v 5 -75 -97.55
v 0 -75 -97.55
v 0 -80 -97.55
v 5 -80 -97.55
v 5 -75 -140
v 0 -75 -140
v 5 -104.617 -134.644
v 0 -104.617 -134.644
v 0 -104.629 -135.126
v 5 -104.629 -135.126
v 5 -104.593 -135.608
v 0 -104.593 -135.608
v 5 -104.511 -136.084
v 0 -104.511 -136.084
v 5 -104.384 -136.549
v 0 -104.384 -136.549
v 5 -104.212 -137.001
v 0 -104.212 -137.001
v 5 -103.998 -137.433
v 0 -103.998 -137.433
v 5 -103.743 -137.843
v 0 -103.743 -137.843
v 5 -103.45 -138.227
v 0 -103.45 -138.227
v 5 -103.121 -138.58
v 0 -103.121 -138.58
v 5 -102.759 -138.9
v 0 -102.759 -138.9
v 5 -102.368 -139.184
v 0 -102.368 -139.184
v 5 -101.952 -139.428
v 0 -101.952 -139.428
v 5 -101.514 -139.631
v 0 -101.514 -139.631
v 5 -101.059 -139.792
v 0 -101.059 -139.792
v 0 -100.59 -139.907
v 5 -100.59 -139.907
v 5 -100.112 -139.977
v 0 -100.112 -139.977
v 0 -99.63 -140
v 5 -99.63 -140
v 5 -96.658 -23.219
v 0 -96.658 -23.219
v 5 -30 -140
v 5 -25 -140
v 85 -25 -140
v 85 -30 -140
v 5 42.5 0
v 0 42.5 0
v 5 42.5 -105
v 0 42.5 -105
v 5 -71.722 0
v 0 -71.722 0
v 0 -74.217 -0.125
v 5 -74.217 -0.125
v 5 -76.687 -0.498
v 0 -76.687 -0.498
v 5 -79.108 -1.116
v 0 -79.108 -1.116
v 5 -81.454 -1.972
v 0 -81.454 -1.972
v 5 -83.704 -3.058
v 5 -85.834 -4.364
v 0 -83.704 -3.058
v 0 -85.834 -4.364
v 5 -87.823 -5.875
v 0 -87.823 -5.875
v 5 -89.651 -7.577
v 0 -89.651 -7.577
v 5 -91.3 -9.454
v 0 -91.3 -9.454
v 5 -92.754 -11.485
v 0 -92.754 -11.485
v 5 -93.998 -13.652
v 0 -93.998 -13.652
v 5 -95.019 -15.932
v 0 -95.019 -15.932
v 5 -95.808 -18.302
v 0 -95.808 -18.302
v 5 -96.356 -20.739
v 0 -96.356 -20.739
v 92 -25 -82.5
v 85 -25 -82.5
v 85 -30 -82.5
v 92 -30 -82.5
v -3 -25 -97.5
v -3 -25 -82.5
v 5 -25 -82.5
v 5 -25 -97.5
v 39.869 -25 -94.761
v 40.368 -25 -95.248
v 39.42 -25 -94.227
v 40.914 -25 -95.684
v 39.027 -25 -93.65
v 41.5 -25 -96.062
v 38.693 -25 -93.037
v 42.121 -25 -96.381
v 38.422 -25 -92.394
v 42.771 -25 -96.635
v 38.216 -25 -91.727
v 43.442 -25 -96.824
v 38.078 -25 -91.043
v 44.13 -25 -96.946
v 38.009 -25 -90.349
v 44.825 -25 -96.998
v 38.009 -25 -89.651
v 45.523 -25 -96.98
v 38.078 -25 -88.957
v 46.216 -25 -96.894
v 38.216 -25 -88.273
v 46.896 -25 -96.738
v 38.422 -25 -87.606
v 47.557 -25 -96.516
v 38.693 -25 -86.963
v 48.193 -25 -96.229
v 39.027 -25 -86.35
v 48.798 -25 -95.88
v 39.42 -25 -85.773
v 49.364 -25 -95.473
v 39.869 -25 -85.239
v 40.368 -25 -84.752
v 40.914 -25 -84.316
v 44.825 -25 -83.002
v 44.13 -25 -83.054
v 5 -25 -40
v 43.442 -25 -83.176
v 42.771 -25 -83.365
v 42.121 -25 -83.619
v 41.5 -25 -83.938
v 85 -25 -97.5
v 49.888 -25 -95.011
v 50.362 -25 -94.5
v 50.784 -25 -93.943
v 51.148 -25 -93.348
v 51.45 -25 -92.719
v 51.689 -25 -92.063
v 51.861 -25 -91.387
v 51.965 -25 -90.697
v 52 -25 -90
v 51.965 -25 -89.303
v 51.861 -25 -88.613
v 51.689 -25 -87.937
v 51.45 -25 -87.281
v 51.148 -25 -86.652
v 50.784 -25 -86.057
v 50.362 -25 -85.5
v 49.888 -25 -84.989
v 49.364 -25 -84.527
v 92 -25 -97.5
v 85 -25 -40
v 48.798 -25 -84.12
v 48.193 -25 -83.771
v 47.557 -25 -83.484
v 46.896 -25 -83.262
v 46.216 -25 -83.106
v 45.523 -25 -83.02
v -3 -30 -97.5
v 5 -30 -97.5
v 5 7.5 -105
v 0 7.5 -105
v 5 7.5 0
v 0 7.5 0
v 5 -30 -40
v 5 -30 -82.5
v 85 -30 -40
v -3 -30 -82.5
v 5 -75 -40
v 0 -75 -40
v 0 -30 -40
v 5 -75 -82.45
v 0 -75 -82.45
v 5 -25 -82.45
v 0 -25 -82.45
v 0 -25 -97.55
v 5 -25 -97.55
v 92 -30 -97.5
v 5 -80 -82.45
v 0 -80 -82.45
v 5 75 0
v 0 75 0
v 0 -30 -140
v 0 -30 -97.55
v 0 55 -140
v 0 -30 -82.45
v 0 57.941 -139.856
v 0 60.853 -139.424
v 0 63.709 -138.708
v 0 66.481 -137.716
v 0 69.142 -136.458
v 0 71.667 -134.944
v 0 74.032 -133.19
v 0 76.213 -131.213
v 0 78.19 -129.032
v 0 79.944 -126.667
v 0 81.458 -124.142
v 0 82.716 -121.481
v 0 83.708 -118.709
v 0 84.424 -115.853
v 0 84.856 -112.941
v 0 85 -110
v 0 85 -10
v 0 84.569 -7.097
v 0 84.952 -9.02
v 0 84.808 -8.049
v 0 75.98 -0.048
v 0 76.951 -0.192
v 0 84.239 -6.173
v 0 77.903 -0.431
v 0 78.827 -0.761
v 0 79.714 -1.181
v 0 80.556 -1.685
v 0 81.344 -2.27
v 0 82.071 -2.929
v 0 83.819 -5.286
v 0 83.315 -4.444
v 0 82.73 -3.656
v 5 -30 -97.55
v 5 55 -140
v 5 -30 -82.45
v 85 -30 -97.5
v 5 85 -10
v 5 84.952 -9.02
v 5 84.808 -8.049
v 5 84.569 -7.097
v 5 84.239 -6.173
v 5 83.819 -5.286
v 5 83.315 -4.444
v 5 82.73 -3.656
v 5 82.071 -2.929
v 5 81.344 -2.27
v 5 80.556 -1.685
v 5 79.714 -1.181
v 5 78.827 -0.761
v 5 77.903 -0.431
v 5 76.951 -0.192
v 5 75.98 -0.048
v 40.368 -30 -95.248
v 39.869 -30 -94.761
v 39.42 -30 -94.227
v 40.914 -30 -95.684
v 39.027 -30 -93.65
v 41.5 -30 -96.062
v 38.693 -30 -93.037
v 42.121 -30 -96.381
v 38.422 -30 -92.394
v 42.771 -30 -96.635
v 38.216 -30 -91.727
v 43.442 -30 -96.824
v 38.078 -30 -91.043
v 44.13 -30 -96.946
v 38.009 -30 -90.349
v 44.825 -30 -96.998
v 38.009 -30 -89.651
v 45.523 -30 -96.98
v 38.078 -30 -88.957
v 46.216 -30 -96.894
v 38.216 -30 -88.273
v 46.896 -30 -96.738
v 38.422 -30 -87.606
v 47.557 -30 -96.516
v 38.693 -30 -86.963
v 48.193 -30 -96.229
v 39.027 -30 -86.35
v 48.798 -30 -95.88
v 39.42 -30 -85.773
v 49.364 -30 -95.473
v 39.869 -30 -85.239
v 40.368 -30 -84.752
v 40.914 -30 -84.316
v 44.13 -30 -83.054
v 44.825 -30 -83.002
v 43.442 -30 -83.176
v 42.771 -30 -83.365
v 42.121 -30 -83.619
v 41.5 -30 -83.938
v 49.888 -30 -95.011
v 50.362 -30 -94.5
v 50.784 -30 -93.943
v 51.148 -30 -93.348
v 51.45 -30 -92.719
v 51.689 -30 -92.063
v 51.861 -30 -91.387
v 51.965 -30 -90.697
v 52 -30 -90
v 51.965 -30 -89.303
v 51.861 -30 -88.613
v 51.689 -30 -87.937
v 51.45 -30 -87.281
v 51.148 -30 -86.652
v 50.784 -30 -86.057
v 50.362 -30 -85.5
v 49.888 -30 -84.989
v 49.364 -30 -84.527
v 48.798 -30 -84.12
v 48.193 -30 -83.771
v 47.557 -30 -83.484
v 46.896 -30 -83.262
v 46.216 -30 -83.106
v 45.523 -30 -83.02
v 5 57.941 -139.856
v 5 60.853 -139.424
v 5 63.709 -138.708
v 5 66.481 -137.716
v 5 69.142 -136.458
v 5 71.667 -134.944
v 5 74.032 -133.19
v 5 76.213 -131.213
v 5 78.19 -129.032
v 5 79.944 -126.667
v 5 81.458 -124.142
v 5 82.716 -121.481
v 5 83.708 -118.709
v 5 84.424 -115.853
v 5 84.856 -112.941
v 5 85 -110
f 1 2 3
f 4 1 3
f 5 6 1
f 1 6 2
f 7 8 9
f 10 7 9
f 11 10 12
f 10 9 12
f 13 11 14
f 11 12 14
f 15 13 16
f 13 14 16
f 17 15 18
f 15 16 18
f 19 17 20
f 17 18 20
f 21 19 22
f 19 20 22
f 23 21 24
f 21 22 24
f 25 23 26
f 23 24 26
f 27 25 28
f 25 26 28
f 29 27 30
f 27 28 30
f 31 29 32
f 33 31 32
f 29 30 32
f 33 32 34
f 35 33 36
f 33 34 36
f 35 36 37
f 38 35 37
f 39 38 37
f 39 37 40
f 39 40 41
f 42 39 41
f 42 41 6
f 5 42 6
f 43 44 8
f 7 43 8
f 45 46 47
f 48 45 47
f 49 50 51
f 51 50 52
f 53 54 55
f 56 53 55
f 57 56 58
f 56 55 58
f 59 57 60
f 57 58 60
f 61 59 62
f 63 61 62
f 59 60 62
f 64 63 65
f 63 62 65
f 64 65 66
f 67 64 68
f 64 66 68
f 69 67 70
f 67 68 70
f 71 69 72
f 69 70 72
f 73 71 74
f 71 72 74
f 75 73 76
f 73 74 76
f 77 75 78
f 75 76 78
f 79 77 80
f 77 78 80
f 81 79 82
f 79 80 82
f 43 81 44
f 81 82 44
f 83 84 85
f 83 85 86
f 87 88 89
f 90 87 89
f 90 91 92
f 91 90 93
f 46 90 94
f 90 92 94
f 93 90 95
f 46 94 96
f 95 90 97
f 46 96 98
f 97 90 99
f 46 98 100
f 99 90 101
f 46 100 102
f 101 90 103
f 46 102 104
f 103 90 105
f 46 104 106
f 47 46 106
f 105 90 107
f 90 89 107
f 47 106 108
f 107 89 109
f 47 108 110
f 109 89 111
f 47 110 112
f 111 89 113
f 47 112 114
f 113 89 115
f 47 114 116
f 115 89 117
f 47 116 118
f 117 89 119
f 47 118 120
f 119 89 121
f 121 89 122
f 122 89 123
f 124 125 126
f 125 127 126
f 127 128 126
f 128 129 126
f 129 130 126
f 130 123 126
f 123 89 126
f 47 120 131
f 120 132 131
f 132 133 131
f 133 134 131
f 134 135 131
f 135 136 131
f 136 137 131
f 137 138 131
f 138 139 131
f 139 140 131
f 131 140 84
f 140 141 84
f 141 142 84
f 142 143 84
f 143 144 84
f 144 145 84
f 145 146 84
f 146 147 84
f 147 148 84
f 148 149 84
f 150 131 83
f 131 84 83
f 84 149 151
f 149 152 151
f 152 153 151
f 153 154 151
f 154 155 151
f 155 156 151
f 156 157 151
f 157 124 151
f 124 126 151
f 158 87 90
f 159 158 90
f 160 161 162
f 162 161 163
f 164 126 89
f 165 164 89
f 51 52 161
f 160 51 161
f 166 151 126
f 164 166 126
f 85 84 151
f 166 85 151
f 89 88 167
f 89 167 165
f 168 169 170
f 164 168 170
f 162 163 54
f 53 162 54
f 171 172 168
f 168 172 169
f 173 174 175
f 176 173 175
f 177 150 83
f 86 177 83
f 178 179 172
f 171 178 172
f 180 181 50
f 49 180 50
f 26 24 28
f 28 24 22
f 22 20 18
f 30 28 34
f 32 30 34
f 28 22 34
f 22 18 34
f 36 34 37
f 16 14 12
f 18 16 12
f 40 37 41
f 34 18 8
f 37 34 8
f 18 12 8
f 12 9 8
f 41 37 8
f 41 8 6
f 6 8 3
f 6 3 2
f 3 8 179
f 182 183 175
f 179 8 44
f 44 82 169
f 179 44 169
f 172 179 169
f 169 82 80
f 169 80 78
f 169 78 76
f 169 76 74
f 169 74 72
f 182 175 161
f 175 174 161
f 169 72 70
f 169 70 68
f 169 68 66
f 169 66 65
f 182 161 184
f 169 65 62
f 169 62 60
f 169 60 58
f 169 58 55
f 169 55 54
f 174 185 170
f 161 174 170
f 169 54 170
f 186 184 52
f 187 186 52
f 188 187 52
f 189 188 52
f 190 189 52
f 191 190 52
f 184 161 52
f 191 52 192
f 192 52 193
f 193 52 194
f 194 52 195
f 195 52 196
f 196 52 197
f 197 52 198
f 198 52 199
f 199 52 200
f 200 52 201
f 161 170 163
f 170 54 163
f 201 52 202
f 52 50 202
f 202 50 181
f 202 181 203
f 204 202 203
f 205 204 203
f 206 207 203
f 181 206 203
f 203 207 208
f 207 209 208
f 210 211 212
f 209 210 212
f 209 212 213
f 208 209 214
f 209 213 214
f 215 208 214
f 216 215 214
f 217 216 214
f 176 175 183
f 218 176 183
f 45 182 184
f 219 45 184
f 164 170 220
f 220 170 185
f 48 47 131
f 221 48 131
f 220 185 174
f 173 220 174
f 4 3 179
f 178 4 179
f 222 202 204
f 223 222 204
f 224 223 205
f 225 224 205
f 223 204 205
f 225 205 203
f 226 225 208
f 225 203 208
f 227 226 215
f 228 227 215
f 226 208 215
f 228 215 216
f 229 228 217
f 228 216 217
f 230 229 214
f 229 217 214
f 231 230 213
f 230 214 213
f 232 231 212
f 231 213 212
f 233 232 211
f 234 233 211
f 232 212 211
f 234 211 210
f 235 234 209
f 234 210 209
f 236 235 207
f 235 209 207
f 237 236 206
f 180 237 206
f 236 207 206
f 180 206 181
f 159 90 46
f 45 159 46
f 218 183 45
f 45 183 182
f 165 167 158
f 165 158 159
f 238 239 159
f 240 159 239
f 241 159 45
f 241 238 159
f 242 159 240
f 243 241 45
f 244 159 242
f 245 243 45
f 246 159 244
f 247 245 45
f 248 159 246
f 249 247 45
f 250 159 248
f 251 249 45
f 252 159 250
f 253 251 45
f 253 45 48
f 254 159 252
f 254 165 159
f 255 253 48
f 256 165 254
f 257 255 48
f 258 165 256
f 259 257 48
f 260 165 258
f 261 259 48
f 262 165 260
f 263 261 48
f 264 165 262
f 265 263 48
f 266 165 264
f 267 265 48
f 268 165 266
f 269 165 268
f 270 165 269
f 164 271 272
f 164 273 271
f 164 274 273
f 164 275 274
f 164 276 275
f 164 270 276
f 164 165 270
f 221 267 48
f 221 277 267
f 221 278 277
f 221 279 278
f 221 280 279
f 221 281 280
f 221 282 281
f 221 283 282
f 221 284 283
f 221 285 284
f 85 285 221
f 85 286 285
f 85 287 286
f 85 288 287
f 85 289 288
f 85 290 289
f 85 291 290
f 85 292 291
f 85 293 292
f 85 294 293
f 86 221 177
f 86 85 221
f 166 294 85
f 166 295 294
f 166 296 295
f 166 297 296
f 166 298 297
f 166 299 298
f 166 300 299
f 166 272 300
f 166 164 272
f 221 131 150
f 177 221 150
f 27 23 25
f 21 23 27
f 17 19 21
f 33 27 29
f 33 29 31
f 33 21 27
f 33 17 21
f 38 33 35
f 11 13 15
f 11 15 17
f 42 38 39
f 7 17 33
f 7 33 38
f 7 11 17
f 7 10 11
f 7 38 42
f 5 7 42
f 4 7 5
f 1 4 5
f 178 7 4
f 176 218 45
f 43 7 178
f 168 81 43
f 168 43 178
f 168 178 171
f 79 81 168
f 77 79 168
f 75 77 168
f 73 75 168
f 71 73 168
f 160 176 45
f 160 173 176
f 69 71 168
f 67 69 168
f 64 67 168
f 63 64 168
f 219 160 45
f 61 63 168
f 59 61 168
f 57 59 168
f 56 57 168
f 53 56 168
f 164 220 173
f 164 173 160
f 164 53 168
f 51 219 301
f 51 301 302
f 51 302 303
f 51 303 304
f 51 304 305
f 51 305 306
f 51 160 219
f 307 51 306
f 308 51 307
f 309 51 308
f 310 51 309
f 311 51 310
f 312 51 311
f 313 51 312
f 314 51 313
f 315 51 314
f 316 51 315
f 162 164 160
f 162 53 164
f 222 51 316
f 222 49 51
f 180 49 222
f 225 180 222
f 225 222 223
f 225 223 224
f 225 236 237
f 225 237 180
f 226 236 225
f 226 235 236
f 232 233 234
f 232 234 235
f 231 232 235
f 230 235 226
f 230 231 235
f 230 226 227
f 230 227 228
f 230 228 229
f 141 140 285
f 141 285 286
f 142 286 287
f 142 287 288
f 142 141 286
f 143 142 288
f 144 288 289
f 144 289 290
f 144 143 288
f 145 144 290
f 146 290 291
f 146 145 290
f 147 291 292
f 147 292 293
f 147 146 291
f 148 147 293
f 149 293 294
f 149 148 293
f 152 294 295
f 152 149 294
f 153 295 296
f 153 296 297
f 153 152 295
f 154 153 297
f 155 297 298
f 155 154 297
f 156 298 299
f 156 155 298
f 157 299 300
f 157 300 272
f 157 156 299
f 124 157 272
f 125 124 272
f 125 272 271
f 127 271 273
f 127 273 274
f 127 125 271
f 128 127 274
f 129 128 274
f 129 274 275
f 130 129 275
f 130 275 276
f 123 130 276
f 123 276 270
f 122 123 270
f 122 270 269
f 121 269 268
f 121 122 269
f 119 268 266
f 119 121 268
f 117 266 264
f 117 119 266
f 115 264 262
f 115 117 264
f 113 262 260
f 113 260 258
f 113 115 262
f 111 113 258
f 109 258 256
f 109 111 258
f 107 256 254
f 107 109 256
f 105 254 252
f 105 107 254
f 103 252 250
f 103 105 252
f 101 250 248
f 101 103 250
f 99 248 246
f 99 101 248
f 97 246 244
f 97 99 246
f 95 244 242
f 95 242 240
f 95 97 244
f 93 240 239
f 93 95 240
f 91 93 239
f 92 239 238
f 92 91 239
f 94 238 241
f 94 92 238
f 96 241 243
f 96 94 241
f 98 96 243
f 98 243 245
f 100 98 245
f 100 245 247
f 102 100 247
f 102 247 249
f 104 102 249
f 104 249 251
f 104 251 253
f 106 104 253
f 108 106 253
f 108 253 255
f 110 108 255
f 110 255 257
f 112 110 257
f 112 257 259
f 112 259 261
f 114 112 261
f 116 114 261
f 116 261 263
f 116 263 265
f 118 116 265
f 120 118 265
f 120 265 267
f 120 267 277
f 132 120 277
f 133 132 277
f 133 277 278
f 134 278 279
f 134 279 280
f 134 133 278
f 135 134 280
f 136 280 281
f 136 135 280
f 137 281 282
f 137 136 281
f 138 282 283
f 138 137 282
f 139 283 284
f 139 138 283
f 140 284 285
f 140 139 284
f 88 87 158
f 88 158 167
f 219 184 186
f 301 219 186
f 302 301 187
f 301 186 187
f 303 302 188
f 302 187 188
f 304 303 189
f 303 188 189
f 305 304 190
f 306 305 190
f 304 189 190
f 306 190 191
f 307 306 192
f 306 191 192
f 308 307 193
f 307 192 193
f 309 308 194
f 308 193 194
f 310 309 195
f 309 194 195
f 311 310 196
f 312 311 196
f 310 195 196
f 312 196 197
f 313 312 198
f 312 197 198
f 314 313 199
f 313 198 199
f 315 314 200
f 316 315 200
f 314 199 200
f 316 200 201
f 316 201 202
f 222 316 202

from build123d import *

# Parameters (mm, degrees)
F1_DEPTH = 5
F2_R     = 7
F2_W     = 8
F2_H     = 15
F2_W_2   = 7
F3_DEPTH = 5


with BuildPart() as f1:
    # F0 (on Right) → F1 (new body)
    with BuildSketch(Plane.YZ):
        with BuildLine():
            Line((7.5, -105), (7.5, 0))
            Line((7.5, 0), (0, 0))
            Line((0, 0), (-71.72202, 0))
            ThreePointArc((-71.72202, 0), (-88.758313, -6.703424), (-96.658487, -23.218824))
            Line((-96.658487, -23.218824), (-104.617412, -134.643765))
            ThreePointArc((-104.617412, -134.643765), (-103.289434, -138.407259), (-99.630118, -140))
            Line((-99.630118, -140), (-75, -140))
            Line((-75, -140), (-75, -97.55))
            Line((-75, -97.55), (-80, -97.55))
            Line((-80, -97.55), (-80, -82.45))
            Line((-80, -82.45), (-75, -82.45))
            Line((-75, -82.45), (-75, -40))
            Line((-75, -40), (-30, -40))
            Line((-30, -40), (-30, -82.45))
            Line((-30, -82.45), (-25, -82.45))
            Line((-25, -82.45), (-25, -97.55))
            Line((-25, -97.55), (-30, -97.55))
            Line((-30, -97.55), (-30, -140))
            Line((-30, -140), (55, -140))
            ThreePointArc((55, -140), (76.213203, -131.213203), (85, -110))
            Line((85, -110), (85, -10))
            ThreePointArc((85, -10), (82.071068, -2.928932), (75, 0))
            Line((75, 0), (42.5, 0))
            Line((42.5, 0), (42.5, -105))
            Line((42.5, -105), (7.5, -105))
        make_face()
    extrude(amount=F1_DEPTH)


with BuildPart() as f3:
    # F2 (on face) → F3 (new body)
    with BuildSketch(Plane.XZ.offset(25)):
        Polygon((85, -40), (5, -40), (5, -82.5), (5, -97.5), (5, -140), (85, -140), (85, -97.5), (85, -82.5), align=None)
        with Locations((45, -90)):
            Circle(F2_R, mode=Mode.SUBTRACT)
        with Locations((1, -90)):
            Rectangle(F2_W, F2_H)
        with Locations((88.5, -90)):
            Rectangle(F2_W_2, F2_H)
    extrude(amount=F3_DEPTH)


solid = Compound([f1.part, f3.part])
